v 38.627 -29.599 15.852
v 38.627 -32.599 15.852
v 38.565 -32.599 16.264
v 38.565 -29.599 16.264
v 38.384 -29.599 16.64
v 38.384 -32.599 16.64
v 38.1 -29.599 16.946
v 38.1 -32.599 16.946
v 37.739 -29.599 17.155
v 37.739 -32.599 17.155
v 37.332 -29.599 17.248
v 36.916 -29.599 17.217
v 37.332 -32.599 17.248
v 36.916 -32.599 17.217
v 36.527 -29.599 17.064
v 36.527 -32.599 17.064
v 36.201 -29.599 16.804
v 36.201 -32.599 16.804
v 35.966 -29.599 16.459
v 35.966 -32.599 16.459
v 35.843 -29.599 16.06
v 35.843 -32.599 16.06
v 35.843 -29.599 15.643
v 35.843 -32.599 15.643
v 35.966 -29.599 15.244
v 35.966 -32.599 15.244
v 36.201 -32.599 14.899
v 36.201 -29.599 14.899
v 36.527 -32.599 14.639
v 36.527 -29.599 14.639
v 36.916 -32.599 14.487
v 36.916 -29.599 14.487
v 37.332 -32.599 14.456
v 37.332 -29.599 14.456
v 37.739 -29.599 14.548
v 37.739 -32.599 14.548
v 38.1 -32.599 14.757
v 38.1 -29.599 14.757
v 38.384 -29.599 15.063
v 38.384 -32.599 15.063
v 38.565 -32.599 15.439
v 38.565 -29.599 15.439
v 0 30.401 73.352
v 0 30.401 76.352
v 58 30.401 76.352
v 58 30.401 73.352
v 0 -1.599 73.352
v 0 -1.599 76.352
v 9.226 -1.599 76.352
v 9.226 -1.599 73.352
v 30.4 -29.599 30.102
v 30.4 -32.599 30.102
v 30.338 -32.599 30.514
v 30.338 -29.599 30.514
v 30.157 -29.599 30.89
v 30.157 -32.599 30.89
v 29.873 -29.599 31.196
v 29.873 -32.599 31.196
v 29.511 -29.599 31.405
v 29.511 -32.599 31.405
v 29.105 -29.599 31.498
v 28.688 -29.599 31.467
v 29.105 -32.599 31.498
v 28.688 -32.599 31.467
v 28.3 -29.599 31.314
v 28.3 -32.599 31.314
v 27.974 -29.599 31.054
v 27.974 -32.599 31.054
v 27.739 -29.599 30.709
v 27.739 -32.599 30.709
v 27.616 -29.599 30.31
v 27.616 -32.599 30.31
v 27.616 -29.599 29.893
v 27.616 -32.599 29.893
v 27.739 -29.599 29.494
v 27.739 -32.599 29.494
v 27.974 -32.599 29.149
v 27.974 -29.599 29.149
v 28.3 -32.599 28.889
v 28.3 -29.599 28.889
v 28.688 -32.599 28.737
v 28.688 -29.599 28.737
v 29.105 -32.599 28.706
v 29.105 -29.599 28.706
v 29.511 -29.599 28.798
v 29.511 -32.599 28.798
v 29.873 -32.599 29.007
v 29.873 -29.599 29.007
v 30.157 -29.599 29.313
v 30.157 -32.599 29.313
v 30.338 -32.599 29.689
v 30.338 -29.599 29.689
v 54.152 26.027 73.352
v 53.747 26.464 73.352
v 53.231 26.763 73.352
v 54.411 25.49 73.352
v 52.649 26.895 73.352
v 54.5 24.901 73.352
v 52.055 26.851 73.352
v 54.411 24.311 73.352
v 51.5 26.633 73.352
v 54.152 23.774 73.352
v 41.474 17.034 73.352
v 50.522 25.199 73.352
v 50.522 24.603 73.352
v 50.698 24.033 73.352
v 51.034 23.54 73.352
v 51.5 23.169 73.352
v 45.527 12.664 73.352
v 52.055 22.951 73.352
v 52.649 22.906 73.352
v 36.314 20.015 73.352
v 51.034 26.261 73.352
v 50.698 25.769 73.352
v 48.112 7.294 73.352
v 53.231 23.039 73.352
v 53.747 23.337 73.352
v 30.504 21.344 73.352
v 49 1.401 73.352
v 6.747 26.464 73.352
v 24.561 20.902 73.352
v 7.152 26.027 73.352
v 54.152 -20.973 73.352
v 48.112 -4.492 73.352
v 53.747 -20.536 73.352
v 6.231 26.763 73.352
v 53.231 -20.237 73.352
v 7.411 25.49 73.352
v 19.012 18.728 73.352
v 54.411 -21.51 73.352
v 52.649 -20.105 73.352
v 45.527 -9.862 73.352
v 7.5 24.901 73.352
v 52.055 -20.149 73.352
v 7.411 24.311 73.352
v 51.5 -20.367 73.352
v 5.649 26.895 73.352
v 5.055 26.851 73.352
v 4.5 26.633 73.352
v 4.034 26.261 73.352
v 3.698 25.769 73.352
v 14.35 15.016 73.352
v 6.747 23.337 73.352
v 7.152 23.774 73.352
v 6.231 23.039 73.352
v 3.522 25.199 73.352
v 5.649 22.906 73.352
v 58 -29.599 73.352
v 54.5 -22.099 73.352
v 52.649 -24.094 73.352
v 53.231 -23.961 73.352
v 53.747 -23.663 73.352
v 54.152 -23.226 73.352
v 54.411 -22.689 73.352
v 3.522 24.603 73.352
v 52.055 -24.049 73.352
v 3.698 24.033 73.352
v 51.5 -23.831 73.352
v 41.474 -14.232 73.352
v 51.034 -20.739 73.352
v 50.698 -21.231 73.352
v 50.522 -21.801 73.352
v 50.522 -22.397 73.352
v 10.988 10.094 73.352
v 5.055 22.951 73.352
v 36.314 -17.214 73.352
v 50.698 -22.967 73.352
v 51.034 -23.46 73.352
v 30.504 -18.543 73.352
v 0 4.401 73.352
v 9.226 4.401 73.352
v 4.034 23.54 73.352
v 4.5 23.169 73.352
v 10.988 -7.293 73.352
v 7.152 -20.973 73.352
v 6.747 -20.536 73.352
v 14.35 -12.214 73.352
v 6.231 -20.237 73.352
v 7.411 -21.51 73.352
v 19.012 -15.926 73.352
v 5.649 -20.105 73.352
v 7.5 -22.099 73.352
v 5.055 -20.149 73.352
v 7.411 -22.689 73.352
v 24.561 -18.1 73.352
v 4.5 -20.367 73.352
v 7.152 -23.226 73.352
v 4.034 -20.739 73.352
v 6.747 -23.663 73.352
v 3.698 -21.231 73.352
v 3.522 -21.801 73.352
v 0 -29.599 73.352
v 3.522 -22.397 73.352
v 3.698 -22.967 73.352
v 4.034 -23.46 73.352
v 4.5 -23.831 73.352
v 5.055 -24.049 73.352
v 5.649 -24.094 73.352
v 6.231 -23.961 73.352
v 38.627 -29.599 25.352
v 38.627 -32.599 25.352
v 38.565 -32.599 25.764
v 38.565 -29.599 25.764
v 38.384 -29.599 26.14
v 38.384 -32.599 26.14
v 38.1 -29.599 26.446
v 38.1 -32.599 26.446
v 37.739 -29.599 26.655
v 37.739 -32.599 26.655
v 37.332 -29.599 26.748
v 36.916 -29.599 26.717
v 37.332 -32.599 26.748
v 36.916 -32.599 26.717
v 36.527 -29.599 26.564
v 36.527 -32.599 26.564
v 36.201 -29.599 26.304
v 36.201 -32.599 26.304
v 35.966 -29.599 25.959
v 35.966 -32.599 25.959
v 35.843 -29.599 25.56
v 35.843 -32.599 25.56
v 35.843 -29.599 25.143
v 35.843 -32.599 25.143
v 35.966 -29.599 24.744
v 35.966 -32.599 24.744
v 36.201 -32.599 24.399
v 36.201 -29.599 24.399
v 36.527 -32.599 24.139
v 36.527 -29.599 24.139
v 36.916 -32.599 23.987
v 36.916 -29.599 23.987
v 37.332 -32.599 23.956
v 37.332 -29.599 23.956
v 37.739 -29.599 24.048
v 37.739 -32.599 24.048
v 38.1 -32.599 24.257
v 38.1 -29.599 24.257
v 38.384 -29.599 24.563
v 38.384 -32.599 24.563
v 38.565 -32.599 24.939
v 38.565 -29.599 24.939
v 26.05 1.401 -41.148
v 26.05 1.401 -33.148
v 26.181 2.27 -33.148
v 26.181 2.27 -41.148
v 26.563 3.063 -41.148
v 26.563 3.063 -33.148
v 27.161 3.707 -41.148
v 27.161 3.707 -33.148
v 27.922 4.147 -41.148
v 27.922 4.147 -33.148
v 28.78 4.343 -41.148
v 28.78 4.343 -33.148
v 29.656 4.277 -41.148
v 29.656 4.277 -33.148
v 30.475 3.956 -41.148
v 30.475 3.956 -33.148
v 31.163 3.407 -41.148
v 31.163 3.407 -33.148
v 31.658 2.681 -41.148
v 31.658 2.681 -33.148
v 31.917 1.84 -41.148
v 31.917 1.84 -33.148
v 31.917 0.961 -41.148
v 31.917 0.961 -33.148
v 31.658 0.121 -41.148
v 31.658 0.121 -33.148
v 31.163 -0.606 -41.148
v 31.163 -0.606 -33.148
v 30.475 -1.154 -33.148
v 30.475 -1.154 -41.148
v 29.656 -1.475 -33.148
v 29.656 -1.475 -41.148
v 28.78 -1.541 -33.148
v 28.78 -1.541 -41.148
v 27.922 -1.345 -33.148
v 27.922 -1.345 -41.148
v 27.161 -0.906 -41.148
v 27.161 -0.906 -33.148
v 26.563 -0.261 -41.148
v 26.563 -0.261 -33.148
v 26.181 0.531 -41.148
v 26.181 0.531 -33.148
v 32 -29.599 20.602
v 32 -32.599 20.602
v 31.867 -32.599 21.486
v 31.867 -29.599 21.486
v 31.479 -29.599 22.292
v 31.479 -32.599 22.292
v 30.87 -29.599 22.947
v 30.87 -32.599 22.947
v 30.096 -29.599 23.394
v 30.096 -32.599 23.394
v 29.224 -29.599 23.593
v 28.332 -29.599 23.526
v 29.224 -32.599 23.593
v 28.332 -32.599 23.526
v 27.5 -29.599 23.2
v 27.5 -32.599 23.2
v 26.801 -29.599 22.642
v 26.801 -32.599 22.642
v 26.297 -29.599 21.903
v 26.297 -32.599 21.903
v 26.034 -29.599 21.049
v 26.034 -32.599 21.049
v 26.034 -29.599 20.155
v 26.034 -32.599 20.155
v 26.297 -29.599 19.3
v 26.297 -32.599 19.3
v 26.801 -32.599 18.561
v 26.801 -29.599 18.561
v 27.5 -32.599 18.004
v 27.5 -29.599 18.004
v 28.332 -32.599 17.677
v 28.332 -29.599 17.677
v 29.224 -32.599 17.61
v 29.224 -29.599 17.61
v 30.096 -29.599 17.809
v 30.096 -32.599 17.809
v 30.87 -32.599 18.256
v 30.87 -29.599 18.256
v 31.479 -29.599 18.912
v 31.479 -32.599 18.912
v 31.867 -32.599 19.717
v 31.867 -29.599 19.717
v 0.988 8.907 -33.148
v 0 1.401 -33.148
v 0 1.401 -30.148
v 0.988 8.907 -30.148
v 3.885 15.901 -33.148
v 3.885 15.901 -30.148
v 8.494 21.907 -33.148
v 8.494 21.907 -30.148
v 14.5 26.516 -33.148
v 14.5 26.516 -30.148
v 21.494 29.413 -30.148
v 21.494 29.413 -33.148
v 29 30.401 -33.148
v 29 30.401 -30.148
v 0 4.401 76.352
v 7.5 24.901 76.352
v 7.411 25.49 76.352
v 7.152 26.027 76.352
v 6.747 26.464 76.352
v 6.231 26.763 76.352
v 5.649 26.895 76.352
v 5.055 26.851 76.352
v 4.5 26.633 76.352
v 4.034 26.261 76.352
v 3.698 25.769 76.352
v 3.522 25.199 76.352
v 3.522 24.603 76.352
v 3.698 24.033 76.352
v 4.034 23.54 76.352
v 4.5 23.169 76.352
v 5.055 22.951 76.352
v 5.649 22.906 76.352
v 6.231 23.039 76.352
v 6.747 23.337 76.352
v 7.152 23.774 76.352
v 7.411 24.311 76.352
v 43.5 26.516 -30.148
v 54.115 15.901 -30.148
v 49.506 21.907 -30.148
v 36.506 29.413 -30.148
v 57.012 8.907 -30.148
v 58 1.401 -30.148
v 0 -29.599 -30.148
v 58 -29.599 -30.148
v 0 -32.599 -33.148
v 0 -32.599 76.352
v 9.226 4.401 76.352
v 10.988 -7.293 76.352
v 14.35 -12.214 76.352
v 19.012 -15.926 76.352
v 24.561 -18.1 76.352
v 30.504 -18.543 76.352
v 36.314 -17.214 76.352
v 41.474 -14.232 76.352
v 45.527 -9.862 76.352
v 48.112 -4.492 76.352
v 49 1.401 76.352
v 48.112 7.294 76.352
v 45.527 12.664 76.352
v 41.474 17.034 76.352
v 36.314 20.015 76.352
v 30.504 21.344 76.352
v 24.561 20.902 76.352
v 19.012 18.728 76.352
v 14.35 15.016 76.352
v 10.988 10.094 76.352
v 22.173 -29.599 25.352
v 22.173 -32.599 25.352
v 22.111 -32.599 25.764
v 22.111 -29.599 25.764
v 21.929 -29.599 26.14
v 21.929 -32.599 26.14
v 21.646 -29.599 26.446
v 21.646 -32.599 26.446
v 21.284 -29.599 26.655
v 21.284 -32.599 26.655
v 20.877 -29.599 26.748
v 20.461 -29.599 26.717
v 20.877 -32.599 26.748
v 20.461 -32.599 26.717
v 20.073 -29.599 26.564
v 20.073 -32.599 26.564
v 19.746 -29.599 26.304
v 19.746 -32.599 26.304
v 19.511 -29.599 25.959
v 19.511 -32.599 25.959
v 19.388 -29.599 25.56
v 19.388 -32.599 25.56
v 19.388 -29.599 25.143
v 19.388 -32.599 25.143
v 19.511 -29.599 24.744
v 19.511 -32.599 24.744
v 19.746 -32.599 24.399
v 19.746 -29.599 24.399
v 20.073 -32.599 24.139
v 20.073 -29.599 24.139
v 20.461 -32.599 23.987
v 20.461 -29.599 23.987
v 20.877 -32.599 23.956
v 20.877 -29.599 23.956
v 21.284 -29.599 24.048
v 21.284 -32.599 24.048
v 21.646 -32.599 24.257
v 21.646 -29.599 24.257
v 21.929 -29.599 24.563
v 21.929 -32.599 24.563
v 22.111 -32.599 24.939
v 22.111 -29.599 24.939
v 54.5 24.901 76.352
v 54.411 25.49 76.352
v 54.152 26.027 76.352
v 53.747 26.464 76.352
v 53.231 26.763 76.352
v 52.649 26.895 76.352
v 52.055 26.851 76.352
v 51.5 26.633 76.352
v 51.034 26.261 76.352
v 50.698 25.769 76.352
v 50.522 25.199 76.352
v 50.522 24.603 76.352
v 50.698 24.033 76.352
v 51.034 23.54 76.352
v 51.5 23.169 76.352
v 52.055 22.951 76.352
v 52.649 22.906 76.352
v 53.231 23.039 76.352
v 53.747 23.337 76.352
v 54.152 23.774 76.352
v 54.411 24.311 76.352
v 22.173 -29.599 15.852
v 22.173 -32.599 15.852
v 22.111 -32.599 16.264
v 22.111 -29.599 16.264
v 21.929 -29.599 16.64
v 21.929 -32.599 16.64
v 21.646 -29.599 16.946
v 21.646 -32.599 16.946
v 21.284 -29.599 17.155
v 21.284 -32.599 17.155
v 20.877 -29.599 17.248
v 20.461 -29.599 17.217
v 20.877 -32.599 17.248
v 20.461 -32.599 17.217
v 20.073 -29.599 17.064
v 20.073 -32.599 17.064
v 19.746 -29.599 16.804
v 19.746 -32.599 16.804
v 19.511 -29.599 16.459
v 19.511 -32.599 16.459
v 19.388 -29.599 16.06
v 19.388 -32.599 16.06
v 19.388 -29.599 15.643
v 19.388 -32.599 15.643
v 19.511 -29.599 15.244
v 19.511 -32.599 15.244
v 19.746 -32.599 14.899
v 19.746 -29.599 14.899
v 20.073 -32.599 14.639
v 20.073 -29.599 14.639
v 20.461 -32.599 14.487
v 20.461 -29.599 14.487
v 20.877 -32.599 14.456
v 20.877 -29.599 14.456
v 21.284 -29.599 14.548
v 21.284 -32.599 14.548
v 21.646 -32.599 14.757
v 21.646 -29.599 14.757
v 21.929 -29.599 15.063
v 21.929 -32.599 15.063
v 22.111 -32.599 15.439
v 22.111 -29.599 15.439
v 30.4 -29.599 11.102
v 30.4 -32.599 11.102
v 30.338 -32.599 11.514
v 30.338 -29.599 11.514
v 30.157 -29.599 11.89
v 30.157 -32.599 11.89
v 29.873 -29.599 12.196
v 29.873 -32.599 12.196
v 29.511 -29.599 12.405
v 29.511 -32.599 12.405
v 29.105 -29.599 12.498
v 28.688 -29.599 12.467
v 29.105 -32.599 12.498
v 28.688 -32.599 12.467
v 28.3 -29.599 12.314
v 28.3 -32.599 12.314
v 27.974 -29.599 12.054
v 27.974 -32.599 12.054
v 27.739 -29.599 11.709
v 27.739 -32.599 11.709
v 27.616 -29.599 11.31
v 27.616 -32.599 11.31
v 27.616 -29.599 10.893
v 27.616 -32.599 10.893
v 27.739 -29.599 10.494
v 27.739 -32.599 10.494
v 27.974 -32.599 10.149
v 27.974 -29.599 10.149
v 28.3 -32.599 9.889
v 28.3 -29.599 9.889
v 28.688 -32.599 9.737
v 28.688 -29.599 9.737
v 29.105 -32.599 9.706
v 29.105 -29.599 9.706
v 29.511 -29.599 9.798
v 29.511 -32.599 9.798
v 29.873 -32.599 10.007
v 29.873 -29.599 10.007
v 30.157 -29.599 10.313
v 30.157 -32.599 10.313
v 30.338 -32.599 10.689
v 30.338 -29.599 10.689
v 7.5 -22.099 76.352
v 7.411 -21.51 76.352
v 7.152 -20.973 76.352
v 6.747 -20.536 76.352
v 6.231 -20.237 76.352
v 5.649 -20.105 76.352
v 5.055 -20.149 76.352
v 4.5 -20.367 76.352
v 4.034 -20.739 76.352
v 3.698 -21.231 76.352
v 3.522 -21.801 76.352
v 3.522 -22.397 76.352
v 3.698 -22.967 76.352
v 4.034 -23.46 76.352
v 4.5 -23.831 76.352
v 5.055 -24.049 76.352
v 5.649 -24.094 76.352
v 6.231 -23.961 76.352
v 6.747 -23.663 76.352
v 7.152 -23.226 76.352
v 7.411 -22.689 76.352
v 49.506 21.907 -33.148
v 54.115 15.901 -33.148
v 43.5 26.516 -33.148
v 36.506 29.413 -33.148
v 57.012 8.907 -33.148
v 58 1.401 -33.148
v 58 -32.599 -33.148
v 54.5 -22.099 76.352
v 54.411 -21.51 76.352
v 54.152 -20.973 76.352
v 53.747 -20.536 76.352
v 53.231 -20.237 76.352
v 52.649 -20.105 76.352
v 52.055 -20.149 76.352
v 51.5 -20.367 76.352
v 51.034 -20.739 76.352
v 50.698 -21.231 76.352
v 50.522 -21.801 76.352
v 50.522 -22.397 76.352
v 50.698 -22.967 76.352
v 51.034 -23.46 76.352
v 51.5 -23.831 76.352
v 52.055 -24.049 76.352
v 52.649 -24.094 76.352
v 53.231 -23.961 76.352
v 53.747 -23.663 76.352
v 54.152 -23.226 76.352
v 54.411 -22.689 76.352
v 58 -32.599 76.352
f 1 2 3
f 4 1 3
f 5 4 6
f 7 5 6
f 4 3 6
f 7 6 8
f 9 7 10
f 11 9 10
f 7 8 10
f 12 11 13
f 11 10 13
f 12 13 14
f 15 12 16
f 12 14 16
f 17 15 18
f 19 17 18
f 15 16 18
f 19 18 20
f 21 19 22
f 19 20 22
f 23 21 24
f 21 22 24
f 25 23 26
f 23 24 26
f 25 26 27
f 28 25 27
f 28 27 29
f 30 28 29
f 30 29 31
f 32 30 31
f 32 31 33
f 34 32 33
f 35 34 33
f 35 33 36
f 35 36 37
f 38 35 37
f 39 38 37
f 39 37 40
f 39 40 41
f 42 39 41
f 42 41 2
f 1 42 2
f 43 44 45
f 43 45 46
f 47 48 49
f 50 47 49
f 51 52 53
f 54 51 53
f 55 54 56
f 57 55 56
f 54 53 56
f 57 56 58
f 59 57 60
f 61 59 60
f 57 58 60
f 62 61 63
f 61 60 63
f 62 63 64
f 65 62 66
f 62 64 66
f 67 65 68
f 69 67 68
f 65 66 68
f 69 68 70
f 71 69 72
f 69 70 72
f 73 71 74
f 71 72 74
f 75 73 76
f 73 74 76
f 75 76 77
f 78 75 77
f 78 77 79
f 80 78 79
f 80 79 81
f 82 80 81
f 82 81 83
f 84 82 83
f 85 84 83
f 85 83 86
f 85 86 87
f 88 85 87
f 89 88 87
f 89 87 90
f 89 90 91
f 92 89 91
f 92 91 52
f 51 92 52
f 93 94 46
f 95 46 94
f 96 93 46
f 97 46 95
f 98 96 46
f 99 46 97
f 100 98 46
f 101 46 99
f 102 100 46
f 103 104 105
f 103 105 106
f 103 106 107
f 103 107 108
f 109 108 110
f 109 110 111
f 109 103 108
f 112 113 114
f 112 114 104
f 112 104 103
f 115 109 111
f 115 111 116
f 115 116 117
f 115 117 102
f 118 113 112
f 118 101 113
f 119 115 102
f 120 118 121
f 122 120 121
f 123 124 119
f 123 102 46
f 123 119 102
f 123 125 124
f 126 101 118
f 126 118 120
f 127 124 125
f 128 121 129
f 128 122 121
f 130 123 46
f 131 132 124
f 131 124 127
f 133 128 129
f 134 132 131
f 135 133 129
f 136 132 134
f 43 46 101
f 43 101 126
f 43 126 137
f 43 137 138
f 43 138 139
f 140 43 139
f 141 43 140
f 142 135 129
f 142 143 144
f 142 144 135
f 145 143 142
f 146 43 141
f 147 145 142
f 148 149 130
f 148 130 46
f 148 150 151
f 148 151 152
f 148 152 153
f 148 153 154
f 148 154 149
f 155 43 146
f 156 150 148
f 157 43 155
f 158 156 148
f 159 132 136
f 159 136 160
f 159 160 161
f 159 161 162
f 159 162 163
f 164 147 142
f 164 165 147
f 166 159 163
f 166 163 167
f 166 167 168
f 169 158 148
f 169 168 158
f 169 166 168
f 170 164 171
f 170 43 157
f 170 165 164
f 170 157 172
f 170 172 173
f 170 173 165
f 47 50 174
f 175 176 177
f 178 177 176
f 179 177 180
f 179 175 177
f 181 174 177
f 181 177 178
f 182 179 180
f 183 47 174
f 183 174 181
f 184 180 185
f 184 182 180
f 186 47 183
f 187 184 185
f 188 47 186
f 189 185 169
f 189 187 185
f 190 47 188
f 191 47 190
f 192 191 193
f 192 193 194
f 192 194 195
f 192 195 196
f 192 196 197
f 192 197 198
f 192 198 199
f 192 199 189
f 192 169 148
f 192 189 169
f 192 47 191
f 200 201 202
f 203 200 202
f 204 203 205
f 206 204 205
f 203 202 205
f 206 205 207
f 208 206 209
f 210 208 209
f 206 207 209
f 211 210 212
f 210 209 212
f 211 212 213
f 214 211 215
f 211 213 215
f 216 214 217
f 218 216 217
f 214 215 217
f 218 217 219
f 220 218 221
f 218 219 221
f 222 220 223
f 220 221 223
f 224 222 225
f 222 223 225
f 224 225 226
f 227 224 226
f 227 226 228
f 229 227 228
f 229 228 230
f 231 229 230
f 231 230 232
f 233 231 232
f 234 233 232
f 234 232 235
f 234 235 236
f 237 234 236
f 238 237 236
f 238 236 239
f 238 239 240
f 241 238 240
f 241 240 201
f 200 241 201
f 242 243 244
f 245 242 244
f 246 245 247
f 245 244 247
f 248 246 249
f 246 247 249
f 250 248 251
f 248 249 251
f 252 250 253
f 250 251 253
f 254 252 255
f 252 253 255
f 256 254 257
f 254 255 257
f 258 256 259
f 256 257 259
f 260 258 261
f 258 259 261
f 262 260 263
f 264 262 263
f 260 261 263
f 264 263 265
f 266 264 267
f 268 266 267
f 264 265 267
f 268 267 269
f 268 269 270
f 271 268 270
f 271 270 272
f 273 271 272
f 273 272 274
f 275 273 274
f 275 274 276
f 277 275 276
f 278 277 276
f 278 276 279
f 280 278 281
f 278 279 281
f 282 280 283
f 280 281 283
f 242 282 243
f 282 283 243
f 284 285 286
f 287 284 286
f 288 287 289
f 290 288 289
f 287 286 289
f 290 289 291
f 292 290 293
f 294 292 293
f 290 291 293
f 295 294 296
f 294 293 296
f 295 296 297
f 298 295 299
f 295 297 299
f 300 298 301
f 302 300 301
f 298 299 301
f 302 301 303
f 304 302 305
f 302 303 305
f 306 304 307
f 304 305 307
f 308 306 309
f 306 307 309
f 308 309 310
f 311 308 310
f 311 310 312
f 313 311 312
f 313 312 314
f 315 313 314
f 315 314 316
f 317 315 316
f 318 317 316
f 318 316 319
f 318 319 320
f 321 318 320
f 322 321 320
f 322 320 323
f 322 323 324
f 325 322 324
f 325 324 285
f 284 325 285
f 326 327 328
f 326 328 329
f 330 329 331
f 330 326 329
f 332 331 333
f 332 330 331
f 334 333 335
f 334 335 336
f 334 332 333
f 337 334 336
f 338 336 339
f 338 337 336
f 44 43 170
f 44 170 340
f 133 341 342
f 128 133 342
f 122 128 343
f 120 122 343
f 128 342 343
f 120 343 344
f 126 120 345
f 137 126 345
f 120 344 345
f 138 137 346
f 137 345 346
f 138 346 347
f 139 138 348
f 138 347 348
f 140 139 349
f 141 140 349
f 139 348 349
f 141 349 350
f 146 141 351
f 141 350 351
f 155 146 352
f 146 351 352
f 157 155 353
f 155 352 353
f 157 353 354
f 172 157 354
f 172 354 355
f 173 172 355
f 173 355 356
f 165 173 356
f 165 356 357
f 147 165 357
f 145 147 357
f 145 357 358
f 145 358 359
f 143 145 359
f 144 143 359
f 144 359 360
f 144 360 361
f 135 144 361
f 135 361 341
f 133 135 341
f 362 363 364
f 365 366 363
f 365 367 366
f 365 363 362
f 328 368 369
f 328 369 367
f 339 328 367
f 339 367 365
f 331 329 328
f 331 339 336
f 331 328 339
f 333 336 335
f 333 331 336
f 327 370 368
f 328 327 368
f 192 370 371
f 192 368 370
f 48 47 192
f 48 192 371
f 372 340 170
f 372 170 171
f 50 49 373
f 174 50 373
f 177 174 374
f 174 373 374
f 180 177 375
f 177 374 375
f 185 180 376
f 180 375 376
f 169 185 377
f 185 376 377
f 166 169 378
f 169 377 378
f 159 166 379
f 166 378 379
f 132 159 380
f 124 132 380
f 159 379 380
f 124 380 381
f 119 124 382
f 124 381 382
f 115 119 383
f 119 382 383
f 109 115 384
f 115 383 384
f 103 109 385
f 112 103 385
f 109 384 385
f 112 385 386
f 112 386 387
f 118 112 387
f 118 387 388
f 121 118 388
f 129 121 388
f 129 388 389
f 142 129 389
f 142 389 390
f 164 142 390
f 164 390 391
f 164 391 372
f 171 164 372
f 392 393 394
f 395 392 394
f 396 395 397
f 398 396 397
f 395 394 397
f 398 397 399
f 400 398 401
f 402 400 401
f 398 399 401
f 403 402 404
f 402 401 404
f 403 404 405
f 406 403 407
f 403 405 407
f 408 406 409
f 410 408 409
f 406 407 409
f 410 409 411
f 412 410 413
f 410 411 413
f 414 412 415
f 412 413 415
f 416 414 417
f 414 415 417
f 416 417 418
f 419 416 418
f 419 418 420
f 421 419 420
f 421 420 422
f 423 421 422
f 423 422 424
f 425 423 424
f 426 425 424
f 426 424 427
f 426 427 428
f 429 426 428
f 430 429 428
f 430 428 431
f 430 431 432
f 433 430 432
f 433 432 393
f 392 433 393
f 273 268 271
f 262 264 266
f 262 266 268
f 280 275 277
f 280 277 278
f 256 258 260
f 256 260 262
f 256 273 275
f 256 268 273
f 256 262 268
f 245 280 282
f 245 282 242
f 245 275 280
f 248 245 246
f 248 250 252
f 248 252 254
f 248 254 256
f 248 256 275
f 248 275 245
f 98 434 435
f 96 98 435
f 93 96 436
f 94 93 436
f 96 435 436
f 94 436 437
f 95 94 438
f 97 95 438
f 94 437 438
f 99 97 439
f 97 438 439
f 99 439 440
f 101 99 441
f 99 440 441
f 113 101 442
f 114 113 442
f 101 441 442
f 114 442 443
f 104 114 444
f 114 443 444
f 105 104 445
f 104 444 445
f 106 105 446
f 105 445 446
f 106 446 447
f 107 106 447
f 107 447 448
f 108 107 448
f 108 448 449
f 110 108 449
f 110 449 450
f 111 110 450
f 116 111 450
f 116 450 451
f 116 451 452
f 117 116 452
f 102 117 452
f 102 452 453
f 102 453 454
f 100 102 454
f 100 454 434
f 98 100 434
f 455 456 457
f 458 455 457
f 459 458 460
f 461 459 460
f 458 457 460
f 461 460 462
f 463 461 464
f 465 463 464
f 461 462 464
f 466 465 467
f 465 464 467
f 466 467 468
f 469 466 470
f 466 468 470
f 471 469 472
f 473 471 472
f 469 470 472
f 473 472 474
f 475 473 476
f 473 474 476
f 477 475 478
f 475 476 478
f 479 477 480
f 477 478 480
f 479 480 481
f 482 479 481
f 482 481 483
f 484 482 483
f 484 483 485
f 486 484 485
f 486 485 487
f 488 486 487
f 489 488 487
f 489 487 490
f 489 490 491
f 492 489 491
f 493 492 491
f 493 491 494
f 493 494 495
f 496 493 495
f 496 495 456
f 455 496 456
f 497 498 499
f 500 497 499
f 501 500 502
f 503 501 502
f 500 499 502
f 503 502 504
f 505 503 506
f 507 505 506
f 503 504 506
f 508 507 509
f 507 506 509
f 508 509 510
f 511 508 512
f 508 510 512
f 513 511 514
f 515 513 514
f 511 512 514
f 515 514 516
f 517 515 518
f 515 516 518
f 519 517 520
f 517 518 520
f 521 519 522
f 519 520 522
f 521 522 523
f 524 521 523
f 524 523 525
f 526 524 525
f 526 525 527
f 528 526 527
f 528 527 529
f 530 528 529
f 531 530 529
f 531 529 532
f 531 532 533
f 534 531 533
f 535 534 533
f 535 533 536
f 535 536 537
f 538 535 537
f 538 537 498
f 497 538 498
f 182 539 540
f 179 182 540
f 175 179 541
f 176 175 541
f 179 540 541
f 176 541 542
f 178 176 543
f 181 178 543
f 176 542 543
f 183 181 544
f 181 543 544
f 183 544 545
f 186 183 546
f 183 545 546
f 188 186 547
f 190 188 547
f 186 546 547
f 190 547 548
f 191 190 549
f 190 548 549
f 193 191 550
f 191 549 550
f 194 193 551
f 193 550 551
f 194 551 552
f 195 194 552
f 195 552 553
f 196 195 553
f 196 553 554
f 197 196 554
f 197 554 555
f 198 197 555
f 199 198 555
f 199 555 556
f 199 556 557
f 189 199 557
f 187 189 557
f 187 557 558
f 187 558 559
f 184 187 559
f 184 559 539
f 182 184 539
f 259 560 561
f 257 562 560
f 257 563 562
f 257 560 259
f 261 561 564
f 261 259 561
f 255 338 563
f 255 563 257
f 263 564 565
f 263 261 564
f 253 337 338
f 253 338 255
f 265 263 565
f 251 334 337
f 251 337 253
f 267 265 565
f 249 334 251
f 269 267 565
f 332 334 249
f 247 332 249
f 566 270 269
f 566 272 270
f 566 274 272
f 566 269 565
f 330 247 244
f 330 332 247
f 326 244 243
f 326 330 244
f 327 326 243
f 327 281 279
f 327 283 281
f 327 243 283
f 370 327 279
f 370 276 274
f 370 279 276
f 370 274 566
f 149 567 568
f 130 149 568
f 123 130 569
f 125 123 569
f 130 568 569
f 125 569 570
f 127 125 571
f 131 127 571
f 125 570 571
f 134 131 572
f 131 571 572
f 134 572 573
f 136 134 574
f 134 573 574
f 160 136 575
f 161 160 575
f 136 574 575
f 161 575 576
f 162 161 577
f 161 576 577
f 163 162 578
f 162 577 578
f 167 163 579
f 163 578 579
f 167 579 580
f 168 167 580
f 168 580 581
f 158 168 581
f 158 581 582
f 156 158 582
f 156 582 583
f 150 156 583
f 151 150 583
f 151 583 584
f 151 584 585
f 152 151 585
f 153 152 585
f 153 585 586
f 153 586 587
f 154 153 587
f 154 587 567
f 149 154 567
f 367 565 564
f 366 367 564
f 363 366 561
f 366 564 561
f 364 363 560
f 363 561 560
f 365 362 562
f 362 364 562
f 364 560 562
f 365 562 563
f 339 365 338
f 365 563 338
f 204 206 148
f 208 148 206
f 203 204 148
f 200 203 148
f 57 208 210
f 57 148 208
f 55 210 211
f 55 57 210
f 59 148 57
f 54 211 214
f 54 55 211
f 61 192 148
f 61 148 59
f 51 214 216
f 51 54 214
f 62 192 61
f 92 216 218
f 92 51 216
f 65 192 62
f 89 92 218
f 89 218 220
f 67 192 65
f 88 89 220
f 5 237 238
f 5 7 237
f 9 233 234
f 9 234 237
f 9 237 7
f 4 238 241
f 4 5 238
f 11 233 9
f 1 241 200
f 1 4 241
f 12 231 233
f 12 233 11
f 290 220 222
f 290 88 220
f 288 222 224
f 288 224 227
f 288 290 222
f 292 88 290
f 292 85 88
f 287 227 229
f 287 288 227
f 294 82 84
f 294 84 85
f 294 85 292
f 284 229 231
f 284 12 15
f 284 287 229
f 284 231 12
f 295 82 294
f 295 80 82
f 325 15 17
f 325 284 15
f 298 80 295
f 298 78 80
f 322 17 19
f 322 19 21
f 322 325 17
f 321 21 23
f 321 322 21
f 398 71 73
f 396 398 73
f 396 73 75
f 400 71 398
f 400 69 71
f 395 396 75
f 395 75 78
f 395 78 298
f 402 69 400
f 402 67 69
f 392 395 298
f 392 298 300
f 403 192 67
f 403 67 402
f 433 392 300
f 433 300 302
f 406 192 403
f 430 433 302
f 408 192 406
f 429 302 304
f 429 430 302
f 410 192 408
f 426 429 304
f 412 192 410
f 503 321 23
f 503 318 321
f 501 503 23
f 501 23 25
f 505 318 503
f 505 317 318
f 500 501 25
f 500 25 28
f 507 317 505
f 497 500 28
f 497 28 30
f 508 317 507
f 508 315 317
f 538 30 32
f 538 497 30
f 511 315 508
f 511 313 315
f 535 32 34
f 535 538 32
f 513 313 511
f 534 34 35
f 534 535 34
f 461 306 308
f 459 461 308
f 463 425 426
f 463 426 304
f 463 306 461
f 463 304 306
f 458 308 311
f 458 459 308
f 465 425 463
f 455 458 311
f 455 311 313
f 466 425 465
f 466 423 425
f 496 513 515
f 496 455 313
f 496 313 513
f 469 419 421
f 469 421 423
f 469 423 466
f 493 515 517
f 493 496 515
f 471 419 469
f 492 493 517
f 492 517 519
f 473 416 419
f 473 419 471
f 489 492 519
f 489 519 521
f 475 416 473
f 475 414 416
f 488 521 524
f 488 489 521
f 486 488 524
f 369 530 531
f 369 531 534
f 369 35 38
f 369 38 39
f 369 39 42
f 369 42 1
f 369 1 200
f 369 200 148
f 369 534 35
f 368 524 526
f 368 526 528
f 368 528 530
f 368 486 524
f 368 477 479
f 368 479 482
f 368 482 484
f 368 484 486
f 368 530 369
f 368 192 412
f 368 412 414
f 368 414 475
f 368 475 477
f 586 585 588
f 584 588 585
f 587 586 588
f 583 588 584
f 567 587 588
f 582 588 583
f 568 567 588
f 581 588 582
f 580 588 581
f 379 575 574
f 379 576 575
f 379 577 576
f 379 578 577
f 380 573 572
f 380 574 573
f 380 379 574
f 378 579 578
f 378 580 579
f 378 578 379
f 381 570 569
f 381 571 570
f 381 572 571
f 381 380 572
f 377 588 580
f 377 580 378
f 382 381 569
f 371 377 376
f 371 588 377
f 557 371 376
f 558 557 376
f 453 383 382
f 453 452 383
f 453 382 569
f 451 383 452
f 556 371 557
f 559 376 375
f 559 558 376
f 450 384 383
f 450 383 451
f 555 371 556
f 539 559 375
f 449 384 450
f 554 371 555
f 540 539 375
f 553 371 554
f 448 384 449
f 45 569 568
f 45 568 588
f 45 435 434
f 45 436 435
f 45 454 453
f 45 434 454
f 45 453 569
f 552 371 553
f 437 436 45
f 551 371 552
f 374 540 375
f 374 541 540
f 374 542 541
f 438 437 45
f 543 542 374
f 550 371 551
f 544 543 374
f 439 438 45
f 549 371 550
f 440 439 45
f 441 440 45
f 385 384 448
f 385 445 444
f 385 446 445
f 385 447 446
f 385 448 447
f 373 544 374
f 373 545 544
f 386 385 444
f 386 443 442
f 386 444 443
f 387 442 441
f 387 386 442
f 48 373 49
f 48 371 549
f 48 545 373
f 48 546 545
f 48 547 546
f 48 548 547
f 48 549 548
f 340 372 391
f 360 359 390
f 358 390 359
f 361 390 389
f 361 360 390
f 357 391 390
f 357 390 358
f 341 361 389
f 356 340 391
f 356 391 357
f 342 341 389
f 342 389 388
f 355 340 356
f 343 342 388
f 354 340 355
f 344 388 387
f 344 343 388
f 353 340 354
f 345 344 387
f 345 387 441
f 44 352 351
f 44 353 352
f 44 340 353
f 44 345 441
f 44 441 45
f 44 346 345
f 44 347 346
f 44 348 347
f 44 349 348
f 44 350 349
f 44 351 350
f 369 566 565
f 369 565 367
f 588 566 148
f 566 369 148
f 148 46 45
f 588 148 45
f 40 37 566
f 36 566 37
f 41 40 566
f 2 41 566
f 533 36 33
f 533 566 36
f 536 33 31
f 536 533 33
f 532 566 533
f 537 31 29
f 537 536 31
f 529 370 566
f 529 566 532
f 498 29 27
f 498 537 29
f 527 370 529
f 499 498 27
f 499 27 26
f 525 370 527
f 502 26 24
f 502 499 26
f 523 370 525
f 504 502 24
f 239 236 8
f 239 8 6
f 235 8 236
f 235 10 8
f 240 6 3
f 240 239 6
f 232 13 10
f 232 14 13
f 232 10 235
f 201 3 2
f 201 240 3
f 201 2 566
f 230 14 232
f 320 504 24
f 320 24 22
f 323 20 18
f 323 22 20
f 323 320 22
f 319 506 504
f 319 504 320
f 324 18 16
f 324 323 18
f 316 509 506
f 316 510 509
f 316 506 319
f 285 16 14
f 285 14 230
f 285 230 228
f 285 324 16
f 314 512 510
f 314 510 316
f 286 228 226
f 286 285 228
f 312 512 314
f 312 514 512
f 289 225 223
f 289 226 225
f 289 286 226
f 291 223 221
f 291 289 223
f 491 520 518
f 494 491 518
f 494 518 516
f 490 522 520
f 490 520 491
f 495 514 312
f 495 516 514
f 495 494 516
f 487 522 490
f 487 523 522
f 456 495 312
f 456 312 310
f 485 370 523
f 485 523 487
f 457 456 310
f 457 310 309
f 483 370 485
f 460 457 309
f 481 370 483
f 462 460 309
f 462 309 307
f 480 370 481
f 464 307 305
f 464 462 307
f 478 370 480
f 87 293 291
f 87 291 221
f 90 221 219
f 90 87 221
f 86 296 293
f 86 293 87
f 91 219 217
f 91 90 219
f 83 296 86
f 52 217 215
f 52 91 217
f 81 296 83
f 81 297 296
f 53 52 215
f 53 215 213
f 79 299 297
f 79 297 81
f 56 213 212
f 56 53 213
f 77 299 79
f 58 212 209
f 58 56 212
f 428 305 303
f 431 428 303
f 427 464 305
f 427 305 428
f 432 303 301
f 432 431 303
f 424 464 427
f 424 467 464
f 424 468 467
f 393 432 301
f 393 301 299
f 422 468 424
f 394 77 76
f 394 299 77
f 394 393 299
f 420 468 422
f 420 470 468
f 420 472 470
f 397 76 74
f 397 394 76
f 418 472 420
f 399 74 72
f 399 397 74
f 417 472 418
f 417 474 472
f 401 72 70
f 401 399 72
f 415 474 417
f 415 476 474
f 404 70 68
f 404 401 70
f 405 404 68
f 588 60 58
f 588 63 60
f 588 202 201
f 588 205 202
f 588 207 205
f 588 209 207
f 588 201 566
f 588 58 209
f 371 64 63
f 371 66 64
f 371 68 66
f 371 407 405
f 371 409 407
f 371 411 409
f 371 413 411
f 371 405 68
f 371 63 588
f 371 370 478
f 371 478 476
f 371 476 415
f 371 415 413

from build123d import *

# Parameters (mm, degrees)
BOSS_EXTRUDE1_DEPTH = 58
SKETCH2_R           = 2
SKETCH2_R_2         = 20
CUT_EXTRUDE1_DEPTH  = 58
CUT_EXTRUDE2_DEPTH  = 58
CUT_EXTRUDE3_DEPTH  = 58
SKETCH5_R           = 2.95
BOSS_EXTRUDE2_DEPTH = 8
SKETCH6_R           = 3
SKETCH6_R_2         = 1.4
CUT_EXTRUDE4_DEPTH  = 8
SKETCH7_W           = 29
SKETCH7_H           = 6
CUT_EXTRUDE5_DEPTH  = 10


with BuildPart() as part:
    # Sketch1 → Boss-Extrude1 (new body)
    with BuildSketch(Plane(origin=(0, 0, 0), x_dir=(0, 0, -1), z_dir=(1, 0, 0))):
        Polygon((-73.351671883, 30.400809615), (-73.351671883, -29.599190385), (30.148328117, -29.599190385), (30.148328117, 30.400809615), (33.148328117, 30.400809615), (33.148328117, -32.599190385), (-76.351671883, -32.599190385), (-76.351671883, 30.400809615), align=None)
    extrude(amount=BOSS_EXTRUDE1_DEPTH)

    # Sketch2 → Cut-Extrude1 (cut)
    with BuildSketch(Plane.XY.offset(76.351671883)):
        with Locations((5.5, 24.900809615)):
            Circle(SKETCH2_R)
        with Locations((52.5, 24.900809615)):
            Circle(SKETCH2_R)
        with Locations((52.5, -22.099190385)):
            Circle(SKETCH2_R)
        with Locations((5.5, -22.099190385)):
            Circle(SKETCH2_R)
        with Locations((29, 1.400809615)):
            Circle(SKETCH2_R_2)
    extrude(amount=-CUT_EXTRUDE1_DEPTH, mode=Mode.SUBTRACT)

    # Sketch3 → Cut-Extrude2 (cut)
    with BuildSketch(Plane(origin=(0, 0, -33.148328117), x_dir=(-1, 0, 0), z_dir=(0, 0, -1))):
        with BuildLine():
            Line((-29, 30.400809615), (-58, 30.400809615))
            Line((-58, 30.400809615), (-58, 1.400809615))
            ThreePointArc((-58, 1.400809615), (-49.506096654, 21.90690627), (-29, 30.400809615))
        make_face()
    extrude(amount=-CUT_EXTRUDE2_DEPTH, mode=Mode.SUBTRACT)

    # Sketch4 → Cut-Extrude3 (cut)
    with BuildSketch(Plane(origin=(0, 0, -33.148328117), x_dir=(-1, 0, 0), z_dir=(0, 0, -1))):
        with BuildLine():
            Line((-29, 30.400809615), (0, 30.400809615))
            Line((0, 30.400809615), (0, 1.400809615))
            ThreePointArc((0, 1.400809615), (-8.493903346, 21.90690627), (-29, 30.400809615))
        make_face()
    extrude(amount=-CUT_EXTRUDE3_DEPTH, mode=Mode.SUBTRACT)

    # Sketch5 → Boss-Extrude2 (add)
    with BuildSketch(Plane(origin=(0, 0, -33.148328117), x_dir=(-1, 0, 0), z_dir=(0, 0, -1))):
        with Locations((-29, 1.400809615)):
            Circle(SKETCH5_R)
    extrude(amount=BOSS_EXTRUDE2_DEPTH)

    # Sketch6 → Cut-Extrude4 (cut)
    with BuildSketch(Plane.XZ.offset(32.599190385)):
        with Locations((29, 20.601671883)):
            Circle(SKETCH6_R)
        with Locations((29, 30.101671883)):
            Circle(SKETCH6_R_2)
        with Locations((37.227241336, 25.351671883)):
            Circle(SKETCH6_R_2)
        with Locations((37.227241336, 15.851671883)):
            Circle(SKETCH6_R_2)
        with Locations((29, 11.101671883)):
            Circle(SKETCH6_R_2)
        with Locations((20.772758664, 15.851671883)):
            Circle(SKETCH6_R_2)
        with Locations((20.772758664, 25.351671883)):
            Circle(SKETCH6_R_2)
    extrude(amount=-CUT_EXTRUDE4_DEPTH, mode=Mode.SUBTRACT)

    # Sketch7 → Cut-Extrude5 (cut)
    with BuildSketch(Plane.XY.offset(76.351671883)):
        with Locations((14.5, 1.400809615)):
            Rectangle(SKETCH7_W, SKETCH7_H)
    extrude(amount=-CUT_EXTRUDE5_DEPTH, mode=Mode.SUBTRACT)


solid = part.part
